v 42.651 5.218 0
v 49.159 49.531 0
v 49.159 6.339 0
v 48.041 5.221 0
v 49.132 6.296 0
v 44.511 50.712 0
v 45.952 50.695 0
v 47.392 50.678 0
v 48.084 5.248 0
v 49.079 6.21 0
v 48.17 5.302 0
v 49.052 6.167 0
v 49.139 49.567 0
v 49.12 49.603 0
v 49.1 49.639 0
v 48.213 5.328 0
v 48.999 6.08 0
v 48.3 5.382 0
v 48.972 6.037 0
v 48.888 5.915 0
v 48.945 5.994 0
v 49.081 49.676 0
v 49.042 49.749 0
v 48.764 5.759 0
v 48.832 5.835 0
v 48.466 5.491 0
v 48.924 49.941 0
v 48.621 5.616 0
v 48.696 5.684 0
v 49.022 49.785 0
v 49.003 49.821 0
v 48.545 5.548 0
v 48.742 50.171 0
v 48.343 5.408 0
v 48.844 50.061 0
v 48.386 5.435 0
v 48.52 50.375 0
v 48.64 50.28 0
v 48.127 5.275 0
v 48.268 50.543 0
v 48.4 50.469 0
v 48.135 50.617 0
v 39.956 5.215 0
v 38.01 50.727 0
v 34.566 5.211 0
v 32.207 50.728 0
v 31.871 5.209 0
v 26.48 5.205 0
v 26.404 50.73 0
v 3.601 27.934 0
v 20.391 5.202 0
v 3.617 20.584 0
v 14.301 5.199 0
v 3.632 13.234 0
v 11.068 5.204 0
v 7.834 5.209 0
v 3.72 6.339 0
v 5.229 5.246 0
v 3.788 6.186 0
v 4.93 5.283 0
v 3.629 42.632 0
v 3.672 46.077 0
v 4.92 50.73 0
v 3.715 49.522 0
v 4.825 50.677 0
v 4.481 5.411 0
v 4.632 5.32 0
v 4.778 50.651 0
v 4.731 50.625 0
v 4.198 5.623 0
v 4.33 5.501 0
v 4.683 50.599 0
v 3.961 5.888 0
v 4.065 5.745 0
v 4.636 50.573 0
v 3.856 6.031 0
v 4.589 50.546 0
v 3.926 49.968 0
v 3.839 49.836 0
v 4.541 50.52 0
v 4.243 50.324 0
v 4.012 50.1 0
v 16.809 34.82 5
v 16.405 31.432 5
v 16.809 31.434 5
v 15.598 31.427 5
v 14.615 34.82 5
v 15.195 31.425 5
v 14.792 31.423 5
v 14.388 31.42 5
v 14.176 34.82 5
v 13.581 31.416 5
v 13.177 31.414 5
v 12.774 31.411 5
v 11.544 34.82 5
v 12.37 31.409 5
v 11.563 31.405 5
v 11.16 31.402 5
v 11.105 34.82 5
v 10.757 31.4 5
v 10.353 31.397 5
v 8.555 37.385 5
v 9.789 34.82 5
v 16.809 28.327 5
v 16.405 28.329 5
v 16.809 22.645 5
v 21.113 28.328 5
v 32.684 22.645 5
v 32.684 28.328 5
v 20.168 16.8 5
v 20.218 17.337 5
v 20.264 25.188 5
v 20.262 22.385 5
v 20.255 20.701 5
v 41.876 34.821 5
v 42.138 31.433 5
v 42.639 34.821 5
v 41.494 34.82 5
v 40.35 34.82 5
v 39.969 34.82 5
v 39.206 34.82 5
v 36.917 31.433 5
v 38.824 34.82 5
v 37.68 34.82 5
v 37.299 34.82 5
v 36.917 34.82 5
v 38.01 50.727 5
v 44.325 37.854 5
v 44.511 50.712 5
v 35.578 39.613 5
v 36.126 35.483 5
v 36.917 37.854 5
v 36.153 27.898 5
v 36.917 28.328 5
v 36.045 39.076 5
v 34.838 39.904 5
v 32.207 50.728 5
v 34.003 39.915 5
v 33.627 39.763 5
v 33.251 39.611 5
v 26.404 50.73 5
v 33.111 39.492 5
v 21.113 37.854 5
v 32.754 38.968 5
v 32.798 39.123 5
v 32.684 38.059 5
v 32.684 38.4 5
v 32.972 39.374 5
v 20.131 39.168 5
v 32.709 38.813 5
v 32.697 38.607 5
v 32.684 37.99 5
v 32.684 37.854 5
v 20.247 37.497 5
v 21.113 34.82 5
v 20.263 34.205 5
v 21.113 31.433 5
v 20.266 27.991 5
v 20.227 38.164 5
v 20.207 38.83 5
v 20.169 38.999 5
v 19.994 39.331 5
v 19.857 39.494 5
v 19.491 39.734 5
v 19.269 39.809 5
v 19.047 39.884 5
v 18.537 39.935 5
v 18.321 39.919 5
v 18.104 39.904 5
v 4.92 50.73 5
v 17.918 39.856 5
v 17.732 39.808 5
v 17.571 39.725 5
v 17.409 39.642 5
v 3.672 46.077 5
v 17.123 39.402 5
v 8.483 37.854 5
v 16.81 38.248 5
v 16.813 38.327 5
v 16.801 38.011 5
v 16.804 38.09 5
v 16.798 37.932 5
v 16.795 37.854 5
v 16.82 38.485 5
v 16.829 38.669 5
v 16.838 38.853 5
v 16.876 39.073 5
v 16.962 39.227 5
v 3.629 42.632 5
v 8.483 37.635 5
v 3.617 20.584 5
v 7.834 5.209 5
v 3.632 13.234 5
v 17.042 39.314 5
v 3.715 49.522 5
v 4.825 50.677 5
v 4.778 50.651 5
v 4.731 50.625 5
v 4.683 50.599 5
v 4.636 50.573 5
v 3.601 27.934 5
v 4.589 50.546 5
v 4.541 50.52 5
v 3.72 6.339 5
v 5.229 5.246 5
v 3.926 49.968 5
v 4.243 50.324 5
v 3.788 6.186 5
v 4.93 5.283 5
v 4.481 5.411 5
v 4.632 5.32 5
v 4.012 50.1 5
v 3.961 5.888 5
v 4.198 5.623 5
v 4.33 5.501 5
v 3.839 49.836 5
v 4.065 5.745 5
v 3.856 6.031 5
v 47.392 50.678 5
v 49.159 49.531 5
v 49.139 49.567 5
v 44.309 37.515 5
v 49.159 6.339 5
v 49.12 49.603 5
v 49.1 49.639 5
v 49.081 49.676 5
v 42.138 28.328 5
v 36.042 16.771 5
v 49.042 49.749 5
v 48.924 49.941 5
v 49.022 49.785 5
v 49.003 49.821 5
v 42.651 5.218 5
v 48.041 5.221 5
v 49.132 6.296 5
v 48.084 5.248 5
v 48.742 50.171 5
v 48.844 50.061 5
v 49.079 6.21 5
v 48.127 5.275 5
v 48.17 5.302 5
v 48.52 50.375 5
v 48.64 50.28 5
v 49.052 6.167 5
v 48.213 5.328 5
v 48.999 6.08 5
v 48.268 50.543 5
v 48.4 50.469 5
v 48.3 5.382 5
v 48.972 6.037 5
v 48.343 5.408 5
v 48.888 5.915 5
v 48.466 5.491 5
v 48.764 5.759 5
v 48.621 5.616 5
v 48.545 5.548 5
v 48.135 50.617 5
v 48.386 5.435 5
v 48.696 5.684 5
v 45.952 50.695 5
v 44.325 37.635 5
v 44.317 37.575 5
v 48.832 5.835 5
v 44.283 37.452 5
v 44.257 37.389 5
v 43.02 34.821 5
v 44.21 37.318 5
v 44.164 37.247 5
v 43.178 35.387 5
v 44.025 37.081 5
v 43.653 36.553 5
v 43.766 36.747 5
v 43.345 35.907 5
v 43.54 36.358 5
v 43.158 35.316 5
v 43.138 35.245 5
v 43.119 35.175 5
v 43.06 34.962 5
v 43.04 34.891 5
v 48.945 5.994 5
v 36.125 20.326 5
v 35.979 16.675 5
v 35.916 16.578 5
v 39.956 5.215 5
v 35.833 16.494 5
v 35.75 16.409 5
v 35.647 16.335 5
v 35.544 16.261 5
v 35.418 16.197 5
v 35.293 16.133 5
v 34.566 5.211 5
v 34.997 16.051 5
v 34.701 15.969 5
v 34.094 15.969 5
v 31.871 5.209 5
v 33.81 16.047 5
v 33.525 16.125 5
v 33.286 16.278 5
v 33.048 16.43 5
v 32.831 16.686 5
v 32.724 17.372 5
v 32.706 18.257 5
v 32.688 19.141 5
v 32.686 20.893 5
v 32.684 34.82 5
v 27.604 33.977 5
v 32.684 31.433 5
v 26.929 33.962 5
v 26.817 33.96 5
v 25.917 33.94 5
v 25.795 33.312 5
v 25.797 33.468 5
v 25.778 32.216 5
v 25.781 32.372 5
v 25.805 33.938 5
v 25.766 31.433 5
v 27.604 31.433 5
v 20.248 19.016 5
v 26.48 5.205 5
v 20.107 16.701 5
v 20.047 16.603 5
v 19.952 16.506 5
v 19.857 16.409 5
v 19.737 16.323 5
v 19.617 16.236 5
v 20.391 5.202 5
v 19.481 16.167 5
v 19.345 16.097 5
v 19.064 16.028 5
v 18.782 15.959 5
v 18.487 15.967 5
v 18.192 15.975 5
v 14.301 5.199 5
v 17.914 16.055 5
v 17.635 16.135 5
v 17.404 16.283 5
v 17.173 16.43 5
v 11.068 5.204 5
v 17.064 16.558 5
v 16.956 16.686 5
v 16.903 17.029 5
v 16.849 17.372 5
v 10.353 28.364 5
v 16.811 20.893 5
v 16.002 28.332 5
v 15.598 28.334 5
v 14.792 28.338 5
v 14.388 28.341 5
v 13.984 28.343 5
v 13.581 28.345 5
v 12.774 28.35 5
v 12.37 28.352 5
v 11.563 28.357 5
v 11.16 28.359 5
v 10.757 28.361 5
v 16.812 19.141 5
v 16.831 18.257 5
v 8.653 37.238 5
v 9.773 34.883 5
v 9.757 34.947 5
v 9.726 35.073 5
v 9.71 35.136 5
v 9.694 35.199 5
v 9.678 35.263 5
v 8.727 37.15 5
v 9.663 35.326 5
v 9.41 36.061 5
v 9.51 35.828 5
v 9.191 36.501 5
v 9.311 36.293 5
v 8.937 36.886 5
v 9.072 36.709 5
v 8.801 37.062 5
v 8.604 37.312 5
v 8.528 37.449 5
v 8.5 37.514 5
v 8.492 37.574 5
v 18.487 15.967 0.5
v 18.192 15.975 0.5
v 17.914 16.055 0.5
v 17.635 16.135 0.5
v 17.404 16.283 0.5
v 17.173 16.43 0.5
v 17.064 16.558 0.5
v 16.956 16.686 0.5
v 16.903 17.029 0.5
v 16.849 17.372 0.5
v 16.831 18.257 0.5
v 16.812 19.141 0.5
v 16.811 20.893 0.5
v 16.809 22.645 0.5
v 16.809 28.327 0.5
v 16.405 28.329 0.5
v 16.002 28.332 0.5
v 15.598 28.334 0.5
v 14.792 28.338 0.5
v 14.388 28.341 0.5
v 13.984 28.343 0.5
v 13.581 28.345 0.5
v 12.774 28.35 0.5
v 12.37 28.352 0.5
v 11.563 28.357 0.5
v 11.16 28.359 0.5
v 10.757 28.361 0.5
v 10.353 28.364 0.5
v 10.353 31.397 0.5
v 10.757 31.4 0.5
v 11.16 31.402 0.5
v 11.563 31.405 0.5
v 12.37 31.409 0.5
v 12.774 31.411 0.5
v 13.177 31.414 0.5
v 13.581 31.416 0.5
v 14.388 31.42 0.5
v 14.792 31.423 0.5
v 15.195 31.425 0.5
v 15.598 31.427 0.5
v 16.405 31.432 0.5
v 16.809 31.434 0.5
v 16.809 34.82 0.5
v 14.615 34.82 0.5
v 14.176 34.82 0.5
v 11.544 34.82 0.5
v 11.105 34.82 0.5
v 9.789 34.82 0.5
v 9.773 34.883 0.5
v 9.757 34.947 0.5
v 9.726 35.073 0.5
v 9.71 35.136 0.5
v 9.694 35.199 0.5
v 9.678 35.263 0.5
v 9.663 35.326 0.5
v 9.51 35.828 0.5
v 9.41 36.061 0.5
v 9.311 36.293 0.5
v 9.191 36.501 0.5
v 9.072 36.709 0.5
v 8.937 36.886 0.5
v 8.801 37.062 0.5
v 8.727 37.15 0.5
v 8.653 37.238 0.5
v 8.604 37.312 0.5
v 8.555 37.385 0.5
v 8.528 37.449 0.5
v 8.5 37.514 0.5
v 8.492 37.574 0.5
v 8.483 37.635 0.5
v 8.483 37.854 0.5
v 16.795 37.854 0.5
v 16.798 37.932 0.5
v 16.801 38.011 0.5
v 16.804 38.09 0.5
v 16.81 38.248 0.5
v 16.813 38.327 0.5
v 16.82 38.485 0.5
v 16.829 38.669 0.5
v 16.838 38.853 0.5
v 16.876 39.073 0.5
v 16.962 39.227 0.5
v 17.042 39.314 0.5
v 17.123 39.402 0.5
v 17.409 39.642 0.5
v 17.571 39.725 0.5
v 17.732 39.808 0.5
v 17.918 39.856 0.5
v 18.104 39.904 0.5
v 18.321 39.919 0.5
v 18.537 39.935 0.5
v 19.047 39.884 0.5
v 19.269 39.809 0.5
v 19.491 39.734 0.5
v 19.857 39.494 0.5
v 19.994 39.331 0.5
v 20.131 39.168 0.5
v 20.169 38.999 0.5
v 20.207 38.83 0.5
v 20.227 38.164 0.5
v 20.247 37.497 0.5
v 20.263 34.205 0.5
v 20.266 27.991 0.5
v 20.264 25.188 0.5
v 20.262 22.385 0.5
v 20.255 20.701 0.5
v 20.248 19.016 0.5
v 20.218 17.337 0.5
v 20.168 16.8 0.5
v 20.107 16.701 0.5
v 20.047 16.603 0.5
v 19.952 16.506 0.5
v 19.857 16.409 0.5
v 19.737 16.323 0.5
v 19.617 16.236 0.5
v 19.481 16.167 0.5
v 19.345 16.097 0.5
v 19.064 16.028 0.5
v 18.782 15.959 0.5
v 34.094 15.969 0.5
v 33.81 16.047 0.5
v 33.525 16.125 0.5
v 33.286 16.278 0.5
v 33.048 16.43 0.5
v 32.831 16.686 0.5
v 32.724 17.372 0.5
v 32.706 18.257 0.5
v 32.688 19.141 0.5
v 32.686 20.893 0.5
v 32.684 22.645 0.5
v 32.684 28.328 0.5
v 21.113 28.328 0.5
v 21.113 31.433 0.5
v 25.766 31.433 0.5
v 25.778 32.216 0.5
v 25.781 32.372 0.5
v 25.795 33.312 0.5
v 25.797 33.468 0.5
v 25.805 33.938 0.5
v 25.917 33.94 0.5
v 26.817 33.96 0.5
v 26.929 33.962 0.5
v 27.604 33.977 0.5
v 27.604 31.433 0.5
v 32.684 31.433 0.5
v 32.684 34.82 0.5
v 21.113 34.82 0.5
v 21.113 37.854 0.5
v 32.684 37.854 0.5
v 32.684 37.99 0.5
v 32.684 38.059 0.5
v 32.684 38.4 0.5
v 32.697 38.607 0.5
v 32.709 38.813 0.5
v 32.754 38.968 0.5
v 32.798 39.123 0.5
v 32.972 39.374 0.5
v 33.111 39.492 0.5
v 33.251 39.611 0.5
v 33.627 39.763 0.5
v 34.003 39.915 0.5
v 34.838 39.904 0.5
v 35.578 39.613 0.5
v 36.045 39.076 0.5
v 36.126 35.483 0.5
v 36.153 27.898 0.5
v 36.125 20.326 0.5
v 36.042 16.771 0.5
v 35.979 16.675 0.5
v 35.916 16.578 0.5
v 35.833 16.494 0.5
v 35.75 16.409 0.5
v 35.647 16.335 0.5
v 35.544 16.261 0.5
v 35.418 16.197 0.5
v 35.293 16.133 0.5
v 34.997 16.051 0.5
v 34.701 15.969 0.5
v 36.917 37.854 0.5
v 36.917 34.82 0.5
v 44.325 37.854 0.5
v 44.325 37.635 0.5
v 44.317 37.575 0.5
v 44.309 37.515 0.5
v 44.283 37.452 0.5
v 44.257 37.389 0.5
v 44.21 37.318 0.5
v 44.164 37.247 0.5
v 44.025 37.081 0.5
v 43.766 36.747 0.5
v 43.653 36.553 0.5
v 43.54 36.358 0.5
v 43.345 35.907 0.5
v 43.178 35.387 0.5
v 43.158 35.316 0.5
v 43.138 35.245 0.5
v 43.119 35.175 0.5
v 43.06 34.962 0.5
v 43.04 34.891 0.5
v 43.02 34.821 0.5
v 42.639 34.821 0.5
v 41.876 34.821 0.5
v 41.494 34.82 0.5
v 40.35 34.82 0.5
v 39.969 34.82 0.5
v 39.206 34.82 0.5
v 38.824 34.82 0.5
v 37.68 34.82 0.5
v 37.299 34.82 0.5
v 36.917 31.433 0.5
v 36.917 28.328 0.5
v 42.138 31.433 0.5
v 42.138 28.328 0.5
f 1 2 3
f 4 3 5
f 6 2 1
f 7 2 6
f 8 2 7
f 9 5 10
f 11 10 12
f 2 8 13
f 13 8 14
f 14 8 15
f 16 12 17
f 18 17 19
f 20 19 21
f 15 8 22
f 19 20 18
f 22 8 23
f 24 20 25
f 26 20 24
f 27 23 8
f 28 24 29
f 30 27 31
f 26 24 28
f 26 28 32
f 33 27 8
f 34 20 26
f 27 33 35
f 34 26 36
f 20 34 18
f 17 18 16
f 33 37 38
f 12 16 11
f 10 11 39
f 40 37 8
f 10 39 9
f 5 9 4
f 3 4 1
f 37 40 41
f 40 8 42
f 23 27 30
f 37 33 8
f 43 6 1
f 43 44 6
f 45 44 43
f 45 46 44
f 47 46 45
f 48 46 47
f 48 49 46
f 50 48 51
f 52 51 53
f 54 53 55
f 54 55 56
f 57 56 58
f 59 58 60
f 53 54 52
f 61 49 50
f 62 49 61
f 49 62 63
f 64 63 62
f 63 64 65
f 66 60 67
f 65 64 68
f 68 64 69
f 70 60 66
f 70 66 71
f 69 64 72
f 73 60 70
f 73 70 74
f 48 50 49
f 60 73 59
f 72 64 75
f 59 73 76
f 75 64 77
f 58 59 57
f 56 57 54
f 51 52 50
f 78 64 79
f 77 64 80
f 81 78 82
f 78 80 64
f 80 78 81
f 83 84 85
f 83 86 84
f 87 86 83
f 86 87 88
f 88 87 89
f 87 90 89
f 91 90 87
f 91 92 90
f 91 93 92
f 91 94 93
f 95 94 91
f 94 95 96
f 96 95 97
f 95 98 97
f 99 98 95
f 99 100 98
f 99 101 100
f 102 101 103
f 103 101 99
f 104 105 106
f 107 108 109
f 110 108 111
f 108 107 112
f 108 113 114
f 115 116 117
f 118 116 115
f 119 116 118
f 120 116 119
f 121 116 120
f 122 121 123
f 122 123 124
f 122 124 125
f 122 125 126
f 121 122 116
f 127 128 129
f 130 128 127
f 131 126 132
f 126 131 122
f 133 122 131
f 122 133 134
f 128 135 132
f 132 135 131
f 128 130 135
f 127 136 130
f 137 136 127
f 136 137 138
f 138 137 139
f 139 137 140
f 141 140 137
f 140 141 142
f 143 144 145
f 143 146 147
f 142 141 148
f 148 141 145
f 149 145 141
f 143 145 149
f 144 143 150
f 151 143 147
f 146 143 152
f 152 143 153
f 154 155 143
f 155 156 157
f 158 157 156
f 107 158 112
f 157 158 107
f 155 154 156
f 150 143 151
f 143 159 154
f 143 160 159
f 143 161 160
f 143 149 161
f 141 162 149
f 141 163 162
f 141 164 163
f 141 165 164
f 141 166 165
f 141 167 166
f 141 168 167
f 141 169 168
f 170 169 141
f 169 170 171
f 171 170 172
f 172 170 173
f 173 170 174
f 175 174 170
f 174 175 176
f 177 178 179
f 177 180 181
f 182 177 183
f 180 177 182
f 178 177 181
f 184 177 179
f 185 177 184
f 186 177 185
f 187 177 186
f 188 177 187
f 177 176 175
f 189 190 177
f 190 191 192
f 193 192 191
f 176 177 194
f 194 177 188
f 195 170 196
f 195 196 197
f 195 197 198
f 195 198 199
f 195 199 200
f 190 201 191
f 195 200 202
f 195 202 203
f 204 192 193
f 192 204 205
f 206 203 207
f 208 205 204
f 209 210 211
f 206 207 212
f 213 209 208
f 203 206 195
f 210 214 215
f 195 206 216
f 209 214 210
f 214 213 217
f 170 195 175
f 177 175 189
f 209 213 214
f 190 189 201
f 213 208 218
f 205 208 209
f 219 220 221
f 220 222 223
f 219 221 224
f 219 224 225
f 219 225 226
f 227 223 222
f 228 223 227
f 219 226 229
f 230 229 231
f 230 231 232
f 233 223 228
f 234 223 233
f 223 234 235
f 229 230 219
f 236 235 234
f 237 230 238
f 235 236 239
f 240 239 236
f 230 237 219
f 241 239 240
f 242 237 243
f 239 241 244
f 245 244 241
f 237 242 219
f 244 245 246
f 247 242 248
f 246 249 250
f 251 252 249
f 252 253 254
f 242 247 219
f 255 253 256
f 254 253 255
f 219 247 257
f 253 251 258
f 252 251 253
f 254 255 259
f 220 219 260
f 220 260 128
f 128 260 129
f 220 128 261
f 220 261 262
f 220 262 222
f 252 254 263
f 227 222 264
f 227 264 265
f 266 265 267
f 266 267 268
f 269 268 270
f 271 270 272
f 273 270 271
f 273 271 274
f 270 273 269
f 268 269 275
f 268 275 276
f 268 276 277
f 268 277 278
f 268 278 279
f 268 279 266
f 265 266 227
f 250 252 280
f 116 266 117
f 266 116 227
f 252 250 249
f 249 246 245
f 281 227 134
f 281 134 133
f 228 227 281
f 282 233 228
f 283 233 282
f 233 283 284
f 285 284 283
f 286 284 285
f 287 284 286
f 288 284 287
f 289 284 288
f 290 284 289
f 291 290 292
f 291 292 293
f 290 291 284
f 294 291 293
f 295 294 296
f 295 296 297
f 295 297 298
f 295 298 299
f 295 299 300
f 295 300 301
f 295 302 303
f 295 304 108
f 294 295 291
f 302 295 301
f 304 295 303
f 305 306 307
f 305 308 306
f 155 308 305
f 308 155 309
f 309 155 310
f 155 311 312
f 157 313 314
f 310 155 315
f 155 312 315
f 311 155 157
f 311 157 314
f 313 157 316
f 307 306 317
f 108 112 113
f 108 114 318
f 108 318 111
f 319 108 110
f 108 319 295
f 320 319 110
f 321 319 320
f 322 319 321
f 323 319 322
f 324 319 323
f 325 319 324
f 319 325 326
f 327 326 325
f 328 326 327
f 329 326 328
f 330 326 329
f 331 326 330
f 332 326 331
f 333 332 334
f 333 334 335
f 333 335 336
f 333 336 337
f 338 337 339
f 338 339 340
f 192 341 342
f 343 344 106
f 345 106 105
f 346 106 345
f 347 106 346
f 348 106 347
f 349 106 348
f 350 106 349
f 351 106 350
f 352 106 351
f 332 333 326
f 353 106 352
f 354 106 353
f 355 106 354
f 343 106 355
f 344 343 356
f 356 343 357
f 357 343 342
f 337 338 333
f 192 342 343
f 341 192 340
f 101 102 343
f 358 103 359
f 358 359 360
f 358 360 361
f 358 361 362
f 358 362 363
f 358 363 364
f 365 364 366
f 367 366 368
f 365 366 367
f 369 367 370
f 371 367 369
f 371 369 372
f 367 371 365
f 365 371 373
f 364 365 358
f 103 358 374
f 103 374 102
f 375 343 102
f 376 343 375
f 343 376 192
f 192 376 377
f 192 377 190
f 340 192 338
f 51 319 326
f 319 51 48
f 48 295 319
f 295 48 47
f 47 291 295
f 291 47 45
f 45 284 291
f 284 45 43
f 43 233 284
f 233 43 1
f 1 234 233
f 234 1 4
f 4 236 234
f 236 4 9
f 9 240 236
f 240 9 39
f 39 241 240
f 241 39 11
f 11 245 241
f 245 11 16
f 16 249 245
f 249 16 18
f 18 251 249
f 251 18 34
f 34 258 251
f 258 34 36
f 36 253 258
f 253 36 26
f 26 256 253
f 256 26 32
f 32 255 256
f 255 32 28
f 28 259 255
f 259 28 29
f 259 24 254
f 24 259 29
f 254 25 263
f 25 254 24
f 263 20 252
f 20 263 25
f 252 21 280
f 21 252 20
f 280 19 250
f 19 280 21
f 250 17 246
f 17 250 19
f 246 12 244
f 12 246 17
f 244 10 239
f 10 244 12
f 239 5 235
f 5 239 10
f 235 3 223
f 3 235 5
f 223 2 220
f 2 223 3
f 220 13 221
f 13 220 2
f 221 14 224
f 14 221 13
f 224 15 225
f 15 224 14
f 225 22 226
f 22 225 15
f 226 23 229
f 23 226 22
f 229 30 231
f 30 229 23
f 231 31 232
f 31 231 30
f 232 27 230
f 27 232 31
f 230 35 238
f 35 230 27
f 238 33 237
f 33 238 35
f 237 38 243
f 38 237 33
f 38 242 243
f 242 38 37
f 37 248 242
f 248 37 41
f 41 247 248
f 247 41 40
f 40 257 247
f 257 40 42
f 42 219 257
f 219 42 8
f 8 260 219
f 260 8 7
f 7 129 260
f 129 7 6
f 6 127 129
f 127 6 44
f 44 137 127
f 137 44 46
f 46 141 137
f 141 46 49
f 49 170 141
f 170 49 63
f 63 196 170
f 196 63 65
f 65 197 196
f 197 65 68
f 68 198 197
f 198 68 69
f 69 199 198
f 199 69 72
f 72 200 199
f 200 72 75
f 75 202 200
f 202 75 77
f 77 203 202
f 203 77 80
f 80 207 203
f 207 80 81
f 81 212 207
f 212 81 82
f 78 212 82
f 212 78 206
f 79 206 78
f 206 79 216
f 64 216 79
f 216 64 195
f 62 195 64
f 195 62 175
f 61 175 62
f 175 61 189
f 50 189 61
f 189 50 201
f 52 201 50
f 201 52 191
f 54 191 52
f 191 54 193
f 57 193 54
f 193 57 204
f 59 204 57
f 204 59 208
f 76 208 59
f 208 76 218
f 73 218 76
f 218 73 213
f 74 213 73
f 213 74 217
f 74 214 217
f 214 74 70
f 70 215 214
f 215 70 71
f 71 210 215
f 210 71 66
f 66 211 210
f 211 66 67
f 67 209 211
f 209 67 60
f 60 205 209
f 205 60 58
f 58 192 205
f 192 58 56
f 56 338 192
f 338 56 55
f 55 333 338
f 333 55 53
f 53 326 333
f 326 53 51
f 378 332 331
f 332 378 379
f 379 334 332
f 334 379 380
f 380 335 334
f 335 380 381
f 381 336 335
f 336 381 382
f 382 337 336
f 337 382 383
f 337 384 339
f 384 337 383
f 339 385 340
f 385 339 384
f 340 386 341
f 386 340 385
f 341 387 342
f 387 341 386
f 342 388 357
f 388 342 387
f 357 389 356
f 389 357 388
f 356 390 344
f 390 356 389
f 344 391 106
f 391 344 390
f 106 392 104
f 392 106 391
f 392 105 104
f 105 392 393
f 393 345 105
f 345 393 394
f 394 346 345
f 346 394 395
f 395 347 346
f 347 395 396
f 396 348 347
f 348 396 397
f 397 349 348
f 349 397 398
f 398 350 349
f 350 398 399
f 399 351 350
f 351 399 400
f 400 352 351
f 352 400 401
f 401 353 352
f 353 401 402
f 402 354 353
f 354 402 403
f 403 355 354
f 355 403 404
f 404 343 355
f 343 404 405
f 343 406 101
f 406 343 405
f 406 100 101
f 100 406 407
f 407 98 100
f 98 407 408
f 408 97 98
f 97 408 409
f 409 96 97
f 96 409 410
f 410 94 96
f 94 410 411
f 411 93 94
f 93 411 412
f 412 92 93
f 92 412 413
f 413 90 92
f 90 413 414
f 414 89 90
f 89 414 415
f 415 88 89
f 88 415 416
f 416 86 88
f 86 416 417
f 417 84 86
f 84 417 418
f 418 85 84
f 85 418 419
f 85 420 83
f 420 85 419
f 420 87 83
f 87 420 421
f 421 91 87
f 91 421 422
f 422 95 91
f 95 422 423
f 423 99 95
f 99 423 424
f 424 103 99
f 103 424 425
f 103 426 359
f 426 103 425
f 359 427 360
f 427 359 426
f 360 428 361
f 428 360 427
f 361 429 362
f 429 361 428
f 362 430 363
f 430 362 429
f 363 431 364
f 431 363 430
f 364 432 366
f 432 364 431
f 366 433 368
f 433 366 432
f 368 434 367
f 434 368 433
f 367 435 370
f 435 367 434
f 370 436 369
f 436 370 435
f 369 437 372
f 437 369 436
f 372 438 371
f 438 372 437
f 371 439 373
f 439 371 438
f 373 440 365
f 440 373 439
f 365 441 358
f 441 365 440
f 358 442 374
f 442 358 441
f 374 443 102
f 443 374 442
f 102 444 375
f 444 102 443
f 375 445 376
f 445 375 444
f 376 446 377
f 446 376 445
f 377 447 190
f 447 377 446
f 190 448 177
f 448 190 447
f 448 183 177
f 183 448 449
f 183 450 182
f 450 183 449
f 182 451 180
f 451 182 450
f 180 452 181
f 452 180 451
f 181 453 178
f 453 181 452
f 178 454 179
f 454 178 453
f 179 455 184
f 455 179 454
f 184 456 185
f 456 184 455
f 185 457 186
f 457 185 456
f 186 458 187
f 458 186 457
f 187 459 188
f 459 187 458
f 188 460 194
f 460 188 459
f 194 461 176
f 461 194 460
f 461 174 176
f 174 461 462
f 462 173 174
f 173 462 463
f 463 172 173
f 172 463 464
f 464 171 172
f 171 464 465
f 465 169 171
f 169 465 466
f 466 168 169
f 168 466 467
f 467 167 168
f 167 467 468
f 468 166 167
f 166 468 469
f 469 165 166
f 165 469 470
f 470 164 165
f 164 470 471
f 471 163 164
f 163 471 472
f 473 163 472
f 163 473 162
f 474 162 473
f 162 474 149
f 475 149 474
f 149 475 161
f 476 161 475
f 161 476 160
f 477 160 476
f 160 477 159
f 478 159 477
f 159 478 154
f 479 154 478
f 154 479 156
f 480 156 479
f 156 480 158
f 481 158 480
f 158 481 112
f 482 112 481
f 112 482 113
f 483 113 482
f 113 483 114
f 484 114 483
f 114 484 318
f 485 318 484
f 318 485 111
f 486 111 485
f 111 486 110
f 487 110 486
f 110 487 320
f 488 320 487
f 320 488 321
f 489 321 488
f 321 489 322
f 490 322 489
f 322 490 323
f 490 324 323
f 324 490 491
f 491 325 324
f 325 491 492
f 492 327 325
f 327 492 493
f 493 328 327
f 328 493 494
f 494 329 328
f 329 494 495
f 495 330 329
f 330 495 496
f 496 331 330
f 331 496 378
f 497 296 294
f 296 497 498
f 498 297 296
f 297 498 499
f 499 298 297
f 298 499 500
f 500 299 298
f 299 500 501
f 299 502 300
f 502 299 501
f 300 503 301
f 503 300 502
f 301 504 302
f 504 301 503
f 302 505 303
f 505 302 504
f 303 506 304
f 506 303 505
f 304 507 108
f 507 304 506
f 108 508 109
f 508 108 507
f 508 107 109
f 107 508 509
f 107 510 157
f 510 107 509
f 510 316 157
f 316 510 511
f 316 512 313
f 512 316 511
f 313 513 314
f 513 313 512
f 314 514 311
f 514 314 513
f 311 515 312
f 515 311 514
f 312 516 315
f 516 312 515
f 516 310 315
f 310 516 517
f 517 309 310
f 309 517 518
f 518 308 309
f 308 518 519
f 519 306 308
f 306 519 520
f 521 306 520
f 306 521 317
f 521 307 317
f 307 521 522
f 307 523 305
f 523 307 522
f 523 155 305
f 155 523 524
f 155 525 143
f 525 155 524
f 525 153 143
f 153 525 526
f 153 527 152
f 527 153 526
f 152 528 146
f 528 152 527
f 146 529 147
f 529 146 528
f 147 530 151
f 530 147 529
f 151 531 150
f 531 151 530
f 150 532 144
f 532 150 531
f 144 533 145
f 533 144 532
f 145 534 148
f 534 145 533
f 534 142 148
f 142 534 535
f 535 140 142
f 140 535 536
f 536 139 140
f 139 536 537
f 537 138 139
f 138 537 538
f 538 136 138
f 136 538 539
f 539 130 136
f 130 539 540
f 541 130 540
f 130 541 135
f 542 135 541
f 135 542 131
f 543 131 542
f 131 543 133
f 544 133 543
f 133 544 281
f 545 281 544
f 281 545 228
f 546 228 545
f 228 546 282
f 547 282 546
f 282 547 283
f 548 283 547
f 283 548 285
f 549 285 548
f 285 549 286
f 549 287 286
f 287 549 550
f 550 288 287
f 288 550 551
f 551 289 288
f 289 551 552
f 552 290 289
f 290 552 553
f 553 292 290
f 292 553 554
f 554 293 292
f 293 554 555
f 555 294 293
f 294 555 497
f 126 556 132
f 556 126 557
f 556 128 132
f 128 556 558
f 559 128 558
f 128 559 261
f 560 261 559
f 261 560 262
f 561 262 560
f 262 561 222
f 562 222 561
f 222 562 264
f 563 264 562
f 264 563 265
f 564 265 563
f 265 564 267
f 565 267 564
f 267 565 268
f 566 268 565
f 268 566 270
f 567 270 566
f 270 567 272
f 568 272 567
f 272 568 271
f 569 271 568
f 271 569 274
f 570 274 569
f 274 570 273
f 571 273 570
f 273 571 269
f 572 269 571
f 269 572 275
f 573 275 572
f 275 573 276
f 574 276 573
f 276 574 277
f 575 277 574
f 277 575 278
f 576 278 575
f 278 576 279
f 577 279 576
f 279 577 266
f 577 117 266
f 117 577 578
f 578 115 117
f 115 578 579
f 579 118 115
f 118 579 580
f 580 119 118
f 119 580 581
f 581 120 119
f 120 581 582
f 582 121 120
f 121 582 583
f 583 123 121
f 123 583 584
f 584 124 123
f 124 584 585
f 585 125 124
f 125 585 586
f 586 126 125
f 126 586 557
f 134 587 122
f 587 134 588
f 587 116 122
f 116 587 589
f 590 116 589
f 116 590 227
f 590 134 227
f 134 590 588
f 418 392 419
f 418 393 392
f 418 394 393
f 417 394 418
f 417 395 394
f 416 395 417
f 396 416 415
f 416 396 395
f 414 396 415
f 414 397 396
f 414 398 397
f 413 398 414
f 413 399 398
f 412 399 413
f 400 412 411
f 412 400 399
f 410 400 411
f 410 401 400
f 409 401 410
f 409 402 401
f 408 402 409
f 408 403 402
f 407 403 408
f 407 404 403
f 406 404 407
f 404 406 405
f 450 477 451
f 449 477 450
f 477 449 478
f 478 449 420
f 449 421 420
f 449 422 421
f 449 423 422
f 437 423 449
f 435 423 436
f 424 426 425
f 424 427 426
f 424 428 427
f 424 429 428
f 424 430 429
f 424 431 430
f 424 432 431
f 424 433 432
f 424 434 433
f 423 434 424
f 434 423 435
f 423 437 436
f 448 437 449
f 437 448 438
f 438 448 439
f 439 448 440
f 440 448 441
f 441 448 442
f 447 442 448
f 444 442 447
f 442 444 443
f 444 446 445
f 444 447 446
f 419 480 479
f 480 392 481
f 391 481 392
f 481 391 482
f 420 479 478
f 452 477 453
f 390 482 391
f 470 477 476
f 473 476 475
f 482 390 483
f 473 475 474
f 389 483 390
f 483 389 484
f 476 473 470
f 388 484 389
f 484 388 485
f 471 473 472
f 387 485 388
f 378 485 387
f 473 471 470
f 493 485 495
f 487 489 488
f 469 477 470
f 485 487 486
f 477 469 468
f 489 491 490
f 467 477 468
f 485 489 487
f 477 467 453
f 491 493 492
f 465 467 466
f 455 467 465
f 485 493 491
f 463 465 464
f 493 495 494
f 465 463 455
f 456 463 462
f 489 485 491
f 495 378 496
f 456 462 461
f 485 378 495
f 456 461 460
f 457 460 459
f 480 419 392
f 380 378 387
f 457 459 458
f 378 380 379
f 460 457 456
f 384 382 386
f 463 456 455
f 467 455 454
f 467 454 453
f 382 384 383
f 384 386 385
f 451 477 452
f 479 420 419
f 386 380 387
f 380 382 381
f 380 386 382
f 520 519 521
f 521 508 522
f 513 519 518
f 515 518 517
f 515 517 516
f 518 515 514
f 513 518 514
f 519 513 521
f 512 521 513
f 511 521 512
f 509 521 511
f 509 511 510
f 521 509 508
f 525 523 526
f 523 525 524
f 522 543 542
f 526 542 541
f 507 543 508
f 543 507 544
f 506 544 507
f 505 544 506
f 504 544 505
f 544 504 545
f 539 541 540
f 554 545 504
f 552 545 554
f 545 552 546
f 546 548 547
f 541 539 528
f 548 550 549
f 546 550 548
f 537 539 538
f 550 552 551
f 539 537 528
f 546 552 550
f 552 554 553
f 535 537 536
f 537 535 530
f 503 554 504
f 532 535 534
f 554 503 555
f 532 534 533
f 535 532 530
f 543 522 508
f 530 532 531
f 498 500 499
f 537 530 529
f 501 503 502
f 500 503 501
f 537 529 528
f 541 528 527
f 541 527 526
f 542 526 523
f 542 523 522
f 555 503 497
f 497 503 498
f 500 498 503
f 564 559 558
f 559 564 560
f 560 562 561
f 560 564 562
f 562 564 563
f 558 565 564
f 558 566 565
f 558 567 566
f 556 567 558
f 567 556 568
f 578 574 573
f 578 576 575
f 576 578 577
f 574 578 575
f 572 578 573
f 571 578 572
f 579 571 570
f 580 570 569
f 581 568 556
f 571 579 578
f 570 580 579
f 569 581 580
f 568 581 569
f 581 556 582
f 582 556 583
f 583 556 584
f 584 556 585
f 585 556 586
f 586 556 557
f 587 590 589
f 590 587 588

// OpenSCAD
module logo() {
  scale([0.5, 0.5, 0.5]) {
    linear_extrude(height = 20) import_dxf(file = "logo.dxf");
  }
  translate([12, 20, 0])
  cube([80, 70, 1]);
}

scale([0.5, 0.5, 0.5]) {
  // difference() {
  //   translate([12, 20, 0])
  //   cube([80, 70, 10]);
  //   logo();
  // }
  logo();
}
